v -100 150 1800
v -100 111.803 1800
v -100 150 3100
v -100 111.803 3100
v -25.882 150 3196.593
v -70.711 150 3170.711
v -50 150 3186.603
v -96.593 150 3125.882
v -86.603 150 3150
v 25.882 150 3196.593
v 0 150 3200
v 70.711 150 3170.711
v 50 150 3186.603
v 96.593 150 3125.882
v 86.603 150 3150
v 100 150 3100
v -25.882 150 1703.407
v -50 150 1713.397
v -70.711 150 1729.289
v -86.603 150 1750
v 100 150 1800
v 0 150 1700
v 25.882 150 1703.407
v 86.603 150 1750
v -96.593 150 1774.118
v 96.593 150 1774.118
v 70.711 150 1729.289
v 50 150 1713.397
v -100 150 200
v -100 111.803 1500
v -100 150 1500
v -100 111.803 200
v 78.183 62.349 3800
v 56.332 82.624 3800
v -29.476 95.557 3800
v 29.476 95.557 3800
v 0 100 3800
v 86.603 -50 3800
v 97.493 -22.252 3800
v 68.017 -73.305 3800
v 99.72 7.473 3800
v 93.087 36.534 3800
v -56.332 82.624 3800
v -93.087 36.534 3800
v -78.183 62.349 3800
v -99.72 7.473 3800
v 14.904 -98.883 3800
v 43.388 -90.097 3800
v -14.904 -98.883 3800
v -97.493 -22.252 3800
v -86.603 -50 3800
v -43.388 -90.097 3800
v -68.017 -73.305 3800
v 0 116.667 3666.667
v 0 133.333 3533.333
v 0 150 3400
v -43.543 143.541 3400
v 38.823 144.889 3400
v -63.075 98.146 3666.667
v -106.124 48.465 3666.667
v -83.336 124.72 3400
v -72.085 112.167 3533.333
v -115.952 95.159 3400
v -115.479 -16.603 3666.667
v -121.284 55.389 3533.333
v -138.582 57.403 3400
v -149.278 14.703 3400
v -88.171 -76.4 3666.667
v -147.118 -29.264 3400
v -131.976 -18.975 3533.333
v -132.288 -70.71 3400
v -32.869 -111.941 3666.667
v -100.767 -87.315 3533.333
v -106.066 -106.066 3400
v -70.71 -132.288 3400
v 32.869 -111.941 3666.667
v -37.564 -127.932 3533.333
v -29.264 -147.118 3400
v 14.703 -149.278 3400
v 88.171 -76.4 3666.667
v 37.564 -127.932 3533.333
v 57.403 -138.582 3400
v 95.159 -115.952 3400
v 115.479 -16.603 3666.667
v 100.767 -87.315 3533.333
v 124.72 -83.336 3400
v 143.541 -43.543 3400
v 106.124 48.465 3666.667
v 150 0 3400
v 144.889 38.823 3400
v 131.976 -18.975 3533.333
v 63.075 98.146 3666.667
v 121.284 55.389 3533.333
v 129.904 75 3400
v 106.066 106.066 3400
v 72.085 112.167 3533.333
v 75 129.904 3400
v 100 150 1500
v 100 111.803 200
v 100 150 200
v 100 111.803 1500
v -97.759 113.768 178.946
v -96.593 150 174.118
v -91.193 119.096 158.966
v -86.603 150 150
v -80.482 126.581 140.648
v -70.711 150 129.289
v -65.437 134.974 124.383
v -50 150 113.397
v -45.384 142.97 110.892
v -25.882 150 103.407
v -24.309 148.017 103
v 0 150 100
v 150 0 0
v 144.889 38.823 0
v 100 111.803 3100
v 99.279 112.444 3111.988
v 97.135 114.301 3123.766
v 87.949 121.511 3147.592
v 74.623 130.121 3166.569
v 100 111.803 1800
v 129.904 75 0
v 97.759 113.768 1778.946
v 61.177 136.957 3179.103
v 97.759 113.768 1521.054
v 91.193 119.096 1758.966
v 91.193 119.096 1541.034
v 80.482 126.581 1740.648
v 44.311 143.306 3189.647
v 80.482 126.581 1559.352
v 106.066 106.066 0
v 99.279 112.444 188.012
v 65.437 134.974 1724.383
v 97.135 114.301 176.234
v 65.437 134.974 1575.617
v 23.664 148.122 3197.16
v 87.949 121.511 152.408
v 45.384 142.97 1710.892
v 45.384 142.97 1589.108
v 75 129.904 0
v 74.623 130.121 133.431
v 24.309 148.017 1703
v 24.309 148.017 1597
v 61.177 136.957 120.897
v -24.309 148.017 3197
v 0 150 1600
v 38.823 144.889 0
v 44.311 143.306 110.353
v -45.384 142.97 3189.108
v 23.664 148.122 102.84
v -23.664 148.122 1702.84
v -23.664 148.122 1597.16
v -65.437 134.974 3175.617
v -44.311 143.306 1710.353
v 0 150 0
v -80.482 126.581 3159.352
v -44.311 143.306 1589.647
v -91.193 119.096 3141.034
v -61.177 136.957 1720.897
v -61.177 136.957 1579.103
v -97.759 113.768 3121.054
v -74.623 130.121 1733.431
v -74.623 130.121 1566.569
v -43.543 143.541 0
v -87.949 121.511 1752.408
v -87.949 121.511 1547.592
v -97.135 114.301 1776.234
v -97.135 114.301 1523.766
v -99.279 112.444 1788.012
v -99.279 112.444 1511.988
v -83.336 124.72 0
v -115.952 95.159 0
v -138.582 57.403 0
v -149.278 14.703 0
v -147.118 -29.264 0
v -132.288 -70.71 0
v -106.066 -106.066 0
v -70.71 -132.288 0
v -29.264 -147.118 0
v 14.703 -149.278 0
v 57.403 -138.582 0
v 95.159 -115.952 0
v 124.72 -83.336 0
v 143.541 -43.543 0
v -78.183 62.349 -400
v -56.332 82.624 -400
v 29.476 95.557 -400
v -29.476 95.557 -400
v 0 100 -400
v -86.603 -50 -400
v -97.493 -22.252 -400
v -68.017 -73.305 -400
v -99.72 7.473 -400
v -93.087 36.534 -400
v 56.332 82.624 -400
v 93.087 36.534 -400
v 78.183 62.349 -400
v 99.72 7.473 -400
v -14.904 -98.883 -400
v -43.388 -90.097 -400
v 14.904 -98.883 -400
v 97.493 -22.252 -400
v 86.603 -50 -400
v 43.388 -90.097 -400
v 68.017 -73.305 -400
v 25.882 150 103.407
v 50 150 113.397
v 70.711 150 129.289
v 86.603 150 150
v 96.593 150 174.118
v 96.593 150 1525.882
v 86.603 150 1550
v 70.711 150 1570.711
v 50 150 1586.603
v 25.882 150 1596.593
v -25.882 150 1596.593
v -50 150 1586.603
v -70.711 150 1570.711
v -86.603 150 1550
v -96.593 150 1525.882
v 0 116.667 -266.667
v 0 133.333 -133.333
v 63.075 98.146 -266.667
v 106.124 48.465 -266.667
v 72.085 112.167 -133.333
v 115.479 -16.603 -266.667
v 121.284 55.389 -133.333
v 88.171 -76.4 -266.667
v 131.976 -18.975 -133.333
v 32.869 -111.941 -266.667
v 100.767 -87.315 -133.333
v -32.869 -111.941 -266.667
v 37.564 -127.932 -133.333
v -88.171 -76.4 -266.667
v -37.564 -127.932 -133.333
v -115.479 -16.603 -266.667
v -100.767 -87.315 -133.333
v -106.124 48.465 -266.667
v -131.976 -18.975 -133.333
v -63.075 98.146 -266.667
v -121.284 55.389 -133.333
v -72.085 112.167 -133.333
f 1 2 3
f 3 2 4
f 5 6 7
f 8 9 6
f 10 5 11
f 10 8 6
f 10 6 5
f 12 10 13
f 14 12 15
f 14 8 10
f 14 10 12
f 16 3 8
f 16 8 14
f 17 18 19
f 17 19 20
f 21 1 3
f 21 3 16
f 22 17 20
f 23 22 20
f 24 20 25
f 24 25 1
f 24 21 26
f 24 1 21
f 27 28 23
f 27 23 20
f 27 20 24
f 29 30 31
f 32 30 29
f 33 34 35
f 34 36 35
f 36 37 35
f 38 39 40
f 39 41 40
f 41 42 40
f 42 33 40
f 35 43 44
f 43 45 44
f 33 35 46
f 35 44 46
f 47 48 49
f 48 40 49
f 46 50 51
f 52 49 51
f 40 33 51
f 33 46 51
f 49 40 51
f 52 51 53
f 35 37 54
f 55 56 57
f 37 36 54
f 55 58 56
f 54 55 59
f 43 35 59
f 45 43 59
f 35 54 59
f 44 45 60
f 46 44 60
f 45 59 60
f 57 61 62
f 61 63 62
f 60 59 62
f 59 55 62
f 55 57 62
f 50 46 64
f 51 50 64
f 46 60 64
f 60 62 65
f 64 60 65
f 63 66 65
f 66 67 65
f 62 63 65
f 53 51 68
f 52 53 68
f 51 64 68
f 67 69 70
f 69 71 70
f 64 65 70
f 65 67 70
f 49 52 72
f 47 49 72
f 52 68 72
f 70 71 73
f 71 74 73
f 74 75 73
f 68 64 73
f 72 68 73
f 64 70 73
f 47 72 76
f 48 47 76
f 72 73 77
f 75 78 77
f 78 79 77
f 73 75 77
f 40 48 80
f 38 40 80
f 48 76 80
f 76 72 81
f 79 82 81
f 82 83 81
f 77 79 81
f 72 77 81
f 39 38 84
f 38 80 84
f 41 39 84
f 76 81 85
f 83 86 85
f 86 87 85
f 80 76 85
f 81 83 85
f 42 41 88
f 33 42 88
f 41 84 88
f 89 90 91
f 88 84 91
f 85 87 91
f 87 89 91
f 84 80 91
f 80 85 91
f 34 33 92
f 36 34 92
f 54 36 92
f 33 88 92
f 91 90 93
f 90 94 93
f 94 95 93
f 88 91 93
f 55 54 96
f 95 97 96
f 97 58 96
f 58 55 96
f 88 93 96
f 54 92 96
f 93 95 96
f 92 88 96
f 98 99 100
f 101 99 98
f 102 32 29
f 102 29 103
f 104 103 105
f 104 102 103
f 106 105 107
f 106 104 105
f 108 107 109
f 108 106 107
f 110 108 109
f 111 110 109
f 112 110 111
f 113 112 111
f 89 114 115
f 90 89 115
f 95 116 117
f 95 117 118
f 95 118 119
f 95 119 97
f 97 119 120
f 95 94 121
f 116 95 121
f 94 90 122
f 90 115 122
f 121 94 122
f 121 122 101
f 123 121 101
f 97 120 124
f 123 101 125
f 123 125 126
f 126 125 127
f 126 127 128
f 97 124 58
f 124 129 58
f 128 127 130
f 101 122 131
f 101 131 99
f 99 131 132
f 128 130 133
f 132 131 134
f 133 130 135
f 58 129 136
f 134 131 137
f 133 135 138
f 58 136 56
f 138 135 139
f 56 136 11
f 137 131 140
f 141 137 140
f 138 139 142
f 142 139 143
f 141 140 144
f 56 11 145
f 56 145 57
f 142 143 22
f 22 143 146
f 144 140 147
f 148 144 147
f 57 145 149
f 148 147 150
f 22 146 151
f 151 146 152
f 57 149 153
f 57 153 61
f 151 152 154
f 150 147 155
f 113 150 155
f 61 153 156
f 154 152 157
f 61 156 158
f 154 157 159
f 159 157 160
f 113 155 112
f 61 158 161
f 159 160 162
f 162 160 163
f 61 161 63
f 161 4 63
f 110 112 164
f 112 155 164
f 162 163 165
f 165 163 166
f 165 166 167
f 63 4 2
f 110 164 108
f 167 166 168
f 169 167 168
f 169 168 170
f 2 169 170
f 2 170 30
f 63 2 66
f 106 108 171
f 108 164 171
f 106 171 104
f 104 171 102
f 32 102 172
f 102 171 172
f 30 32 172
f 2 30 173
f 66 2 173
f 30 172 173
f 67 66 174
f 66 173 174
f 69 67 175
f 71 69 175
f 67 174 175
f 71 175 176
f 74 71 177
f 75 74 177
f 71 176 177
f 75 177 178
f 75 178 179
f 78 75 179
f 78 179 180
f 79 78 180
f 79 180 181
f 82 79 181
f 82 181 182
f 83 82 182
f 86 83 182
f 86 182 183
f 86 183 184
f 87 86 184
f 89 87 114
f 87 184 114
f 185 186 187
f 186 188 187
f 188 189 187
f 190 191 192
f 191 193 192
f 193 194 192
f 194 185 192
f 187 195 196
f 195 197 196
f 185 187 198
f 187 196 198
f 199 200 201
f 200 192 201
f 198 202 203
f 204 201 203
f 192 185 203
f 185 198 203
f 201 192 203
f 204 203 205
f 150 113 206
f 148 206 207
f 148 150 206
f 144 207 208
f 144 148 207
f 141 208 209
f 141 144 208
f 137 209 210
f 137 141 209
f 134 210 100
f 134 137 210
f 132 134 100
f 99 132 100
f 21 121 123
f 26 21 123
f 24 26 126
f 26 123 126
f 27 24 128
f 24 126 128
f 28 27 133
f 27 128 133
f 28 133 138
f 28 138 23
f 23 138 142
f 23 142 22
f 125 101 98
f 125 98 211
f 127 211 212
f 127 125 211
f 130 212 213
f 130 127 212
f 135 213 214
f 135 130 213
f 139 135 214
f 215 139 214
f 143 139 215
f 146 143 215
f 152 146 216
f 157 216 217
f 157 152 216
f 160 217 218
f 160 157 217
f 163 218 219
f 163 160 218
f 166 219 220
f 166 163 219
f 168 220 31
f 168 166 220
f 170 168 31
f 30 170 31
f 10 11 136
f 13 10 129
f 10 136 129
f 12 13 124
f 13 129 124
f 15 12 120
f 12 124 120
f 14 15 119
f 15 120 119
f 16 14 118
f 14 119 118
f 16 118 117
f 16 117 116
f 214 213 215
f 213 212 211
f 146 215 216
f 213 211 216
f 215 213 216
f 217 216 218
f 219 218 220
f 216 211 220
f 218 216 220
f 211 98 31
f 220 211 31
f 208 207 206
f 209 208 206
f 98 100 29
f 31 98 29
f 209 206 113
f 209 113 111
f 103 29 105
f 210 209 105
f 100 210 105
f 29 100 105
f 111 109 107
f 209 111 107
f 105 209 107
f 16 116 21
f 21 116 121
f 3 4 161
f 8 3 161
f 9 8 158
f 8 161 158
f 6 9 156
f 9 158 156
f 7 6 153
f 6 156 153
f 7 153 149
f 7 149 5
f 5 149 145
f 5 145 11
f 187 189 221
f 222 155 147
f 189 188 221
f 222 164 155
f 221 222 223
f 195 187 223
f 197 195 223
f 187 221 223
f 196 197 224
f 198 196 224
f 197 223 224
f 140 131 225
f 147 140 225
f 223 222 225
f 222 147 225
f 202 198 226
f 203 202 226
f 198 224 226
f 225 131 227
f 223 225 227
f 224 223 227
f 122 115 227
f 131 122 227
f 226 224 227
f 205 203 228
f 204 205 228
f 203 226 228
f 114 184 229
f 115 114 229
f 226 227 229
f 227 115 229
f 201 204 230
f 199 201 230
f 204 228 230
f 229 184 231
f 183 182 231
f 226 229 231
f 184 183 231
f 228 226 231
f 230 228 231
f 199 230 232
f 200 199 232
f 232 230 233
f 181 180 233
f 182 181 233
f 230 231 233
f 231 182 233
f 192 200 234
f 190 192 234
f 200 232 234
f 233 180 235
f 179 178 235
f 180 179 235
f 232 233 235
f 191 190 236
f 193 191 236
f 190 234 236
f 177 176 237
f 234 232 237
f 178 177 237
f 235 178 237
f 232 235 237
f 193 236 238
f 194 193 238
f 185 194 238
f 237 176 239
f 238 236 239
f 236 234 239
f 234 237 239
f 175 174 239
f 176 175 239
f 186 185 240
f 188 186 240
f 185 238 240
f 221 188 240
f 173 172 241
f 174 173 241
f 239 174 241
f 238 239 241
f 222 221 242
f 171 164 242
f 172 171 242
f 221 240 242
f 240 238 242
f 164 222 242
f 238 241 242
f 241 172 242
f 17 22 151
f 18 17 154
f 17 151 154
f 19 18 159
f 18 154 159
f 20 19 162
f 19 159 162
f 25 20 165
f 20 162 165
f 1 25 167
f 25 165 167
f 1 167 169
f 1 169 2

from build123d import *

# Parameters (mm, degrees)
SECTION_2_R         = 150
BOSS_EXTRUDE1_DEPTH = 3400
BOSS_EXTRUDE2_REACH = 3816.774


with BuildPart() as part:
    # Section 2 → Boss-Extrude1 (new body)
    with BuildSketch(Plane.XY):
        Circle(SECTION_2_R)
    extrude(amount=BOSS_EXTRUDE1_DEPTH)

    # ConoPopa → Revolve1 (revolve)
    with BuildSketch(Plane(origin=(0, 0, 0), x_dir=(0, 0, -1), z_dir=(1, 0, 0))):
        Polygon((400, 0), (400, 100), (0, 150), (0, 0), align=None)
    revolve(axis=Axis((0, 0, 0), (0, 0, -1)))

    # ConoProa → Revolve2 (revolve)
    with BuildSketch(Plane(origin=(0, 0, 0), x_dir=(0, 0, -1), z_dir=(1, 0, 0))):
        Polygon((-3800, 0), (-3800, 100), (-3400, 150), (-3400, 0), align=None)
    revolve(axis=Axis((0, 0, 3400), (0, 0, 1)))

    # Boss-Extrude2: up to this face of the body
    boss_extrude2_end = part.part.faces().sort_by_distance((-150, 0, 1700))[0]
    # Sketch1 → Boss-Extrude2 (add, up to the picked face)
    with BuildSketch(Plane(origin=(0, 150, 0), x_dir=(1, 0, 0), z_dir=(0, 1, 0)), mode=Mode.PRIVATE) as boss_extrude2_sk1:
        with BuildLine():
            Line((-100, -1500), (-100, -200))
            ThreePointArc((-100, -200), (0, -100), (100, -200))
            Line((100, -200), (100, -1500))
            ThreePointArc((100, -1500), (0, -1600), (-100, -1500))
        make_face()
    boss_extrude2_tool1 = split(extrude(boss_extrude2_sk1.sketch, amount=-BOSS_EXTRUDE2_REACH, mode=Mode.PRIVATE), bisect_by=boss_extrude2_end, keep=Keep.BOTH, mode=Mode.PRIVATE)
    # Sketch1 → Boss-Extrude2 (add, up to the picked face)
    with BuildSketch(Plane(origin=(0, 150, 0), x_dir=(1, 0, 0), z_dir=(0, 1, 0)), mode=Mode.PRIVATE) as boss_extrude2_sk2:
        with BuildLine():
            Line((-100, -1800), (-100, -3100))
            ThreePointArc((-100, -3100), (0, -3200), (100, -3100))
            Line((100, -3100), (100, -1800))
            ThreePointArc((100, -1800), (0, -1700), (-100, -1800))
        make_face()
    boss_extrude2_tool2 = split(extrude(boss_extrude2_sk2.sketch, amount=-BOSS_EXTRUDE2_REACH, mode=Mode.PRIVATE), bisect_by=boss_extrude2_end, keep=Keep.BOTH, mode=Mode.PRIVATE)
    add(boss_extrude2_tool1.solids().sort_by(Axis((0, 150, 850), (0, -1, 0)))[0])
    add(boss_extrude2_tool1.solids().sort_by(Axis((0, 150, 850), (0, -1, 0)))[1])
    add(boss_extrude2_tool2.solids().sort_by(Axis((0, 150, 2450), (0, -1, 0)))[0])
    add(boss_extrude2_tool2.solids().sort_by(Axis((0, 150, 2450), (0, -1, 0)))[1])


solid = part.part
